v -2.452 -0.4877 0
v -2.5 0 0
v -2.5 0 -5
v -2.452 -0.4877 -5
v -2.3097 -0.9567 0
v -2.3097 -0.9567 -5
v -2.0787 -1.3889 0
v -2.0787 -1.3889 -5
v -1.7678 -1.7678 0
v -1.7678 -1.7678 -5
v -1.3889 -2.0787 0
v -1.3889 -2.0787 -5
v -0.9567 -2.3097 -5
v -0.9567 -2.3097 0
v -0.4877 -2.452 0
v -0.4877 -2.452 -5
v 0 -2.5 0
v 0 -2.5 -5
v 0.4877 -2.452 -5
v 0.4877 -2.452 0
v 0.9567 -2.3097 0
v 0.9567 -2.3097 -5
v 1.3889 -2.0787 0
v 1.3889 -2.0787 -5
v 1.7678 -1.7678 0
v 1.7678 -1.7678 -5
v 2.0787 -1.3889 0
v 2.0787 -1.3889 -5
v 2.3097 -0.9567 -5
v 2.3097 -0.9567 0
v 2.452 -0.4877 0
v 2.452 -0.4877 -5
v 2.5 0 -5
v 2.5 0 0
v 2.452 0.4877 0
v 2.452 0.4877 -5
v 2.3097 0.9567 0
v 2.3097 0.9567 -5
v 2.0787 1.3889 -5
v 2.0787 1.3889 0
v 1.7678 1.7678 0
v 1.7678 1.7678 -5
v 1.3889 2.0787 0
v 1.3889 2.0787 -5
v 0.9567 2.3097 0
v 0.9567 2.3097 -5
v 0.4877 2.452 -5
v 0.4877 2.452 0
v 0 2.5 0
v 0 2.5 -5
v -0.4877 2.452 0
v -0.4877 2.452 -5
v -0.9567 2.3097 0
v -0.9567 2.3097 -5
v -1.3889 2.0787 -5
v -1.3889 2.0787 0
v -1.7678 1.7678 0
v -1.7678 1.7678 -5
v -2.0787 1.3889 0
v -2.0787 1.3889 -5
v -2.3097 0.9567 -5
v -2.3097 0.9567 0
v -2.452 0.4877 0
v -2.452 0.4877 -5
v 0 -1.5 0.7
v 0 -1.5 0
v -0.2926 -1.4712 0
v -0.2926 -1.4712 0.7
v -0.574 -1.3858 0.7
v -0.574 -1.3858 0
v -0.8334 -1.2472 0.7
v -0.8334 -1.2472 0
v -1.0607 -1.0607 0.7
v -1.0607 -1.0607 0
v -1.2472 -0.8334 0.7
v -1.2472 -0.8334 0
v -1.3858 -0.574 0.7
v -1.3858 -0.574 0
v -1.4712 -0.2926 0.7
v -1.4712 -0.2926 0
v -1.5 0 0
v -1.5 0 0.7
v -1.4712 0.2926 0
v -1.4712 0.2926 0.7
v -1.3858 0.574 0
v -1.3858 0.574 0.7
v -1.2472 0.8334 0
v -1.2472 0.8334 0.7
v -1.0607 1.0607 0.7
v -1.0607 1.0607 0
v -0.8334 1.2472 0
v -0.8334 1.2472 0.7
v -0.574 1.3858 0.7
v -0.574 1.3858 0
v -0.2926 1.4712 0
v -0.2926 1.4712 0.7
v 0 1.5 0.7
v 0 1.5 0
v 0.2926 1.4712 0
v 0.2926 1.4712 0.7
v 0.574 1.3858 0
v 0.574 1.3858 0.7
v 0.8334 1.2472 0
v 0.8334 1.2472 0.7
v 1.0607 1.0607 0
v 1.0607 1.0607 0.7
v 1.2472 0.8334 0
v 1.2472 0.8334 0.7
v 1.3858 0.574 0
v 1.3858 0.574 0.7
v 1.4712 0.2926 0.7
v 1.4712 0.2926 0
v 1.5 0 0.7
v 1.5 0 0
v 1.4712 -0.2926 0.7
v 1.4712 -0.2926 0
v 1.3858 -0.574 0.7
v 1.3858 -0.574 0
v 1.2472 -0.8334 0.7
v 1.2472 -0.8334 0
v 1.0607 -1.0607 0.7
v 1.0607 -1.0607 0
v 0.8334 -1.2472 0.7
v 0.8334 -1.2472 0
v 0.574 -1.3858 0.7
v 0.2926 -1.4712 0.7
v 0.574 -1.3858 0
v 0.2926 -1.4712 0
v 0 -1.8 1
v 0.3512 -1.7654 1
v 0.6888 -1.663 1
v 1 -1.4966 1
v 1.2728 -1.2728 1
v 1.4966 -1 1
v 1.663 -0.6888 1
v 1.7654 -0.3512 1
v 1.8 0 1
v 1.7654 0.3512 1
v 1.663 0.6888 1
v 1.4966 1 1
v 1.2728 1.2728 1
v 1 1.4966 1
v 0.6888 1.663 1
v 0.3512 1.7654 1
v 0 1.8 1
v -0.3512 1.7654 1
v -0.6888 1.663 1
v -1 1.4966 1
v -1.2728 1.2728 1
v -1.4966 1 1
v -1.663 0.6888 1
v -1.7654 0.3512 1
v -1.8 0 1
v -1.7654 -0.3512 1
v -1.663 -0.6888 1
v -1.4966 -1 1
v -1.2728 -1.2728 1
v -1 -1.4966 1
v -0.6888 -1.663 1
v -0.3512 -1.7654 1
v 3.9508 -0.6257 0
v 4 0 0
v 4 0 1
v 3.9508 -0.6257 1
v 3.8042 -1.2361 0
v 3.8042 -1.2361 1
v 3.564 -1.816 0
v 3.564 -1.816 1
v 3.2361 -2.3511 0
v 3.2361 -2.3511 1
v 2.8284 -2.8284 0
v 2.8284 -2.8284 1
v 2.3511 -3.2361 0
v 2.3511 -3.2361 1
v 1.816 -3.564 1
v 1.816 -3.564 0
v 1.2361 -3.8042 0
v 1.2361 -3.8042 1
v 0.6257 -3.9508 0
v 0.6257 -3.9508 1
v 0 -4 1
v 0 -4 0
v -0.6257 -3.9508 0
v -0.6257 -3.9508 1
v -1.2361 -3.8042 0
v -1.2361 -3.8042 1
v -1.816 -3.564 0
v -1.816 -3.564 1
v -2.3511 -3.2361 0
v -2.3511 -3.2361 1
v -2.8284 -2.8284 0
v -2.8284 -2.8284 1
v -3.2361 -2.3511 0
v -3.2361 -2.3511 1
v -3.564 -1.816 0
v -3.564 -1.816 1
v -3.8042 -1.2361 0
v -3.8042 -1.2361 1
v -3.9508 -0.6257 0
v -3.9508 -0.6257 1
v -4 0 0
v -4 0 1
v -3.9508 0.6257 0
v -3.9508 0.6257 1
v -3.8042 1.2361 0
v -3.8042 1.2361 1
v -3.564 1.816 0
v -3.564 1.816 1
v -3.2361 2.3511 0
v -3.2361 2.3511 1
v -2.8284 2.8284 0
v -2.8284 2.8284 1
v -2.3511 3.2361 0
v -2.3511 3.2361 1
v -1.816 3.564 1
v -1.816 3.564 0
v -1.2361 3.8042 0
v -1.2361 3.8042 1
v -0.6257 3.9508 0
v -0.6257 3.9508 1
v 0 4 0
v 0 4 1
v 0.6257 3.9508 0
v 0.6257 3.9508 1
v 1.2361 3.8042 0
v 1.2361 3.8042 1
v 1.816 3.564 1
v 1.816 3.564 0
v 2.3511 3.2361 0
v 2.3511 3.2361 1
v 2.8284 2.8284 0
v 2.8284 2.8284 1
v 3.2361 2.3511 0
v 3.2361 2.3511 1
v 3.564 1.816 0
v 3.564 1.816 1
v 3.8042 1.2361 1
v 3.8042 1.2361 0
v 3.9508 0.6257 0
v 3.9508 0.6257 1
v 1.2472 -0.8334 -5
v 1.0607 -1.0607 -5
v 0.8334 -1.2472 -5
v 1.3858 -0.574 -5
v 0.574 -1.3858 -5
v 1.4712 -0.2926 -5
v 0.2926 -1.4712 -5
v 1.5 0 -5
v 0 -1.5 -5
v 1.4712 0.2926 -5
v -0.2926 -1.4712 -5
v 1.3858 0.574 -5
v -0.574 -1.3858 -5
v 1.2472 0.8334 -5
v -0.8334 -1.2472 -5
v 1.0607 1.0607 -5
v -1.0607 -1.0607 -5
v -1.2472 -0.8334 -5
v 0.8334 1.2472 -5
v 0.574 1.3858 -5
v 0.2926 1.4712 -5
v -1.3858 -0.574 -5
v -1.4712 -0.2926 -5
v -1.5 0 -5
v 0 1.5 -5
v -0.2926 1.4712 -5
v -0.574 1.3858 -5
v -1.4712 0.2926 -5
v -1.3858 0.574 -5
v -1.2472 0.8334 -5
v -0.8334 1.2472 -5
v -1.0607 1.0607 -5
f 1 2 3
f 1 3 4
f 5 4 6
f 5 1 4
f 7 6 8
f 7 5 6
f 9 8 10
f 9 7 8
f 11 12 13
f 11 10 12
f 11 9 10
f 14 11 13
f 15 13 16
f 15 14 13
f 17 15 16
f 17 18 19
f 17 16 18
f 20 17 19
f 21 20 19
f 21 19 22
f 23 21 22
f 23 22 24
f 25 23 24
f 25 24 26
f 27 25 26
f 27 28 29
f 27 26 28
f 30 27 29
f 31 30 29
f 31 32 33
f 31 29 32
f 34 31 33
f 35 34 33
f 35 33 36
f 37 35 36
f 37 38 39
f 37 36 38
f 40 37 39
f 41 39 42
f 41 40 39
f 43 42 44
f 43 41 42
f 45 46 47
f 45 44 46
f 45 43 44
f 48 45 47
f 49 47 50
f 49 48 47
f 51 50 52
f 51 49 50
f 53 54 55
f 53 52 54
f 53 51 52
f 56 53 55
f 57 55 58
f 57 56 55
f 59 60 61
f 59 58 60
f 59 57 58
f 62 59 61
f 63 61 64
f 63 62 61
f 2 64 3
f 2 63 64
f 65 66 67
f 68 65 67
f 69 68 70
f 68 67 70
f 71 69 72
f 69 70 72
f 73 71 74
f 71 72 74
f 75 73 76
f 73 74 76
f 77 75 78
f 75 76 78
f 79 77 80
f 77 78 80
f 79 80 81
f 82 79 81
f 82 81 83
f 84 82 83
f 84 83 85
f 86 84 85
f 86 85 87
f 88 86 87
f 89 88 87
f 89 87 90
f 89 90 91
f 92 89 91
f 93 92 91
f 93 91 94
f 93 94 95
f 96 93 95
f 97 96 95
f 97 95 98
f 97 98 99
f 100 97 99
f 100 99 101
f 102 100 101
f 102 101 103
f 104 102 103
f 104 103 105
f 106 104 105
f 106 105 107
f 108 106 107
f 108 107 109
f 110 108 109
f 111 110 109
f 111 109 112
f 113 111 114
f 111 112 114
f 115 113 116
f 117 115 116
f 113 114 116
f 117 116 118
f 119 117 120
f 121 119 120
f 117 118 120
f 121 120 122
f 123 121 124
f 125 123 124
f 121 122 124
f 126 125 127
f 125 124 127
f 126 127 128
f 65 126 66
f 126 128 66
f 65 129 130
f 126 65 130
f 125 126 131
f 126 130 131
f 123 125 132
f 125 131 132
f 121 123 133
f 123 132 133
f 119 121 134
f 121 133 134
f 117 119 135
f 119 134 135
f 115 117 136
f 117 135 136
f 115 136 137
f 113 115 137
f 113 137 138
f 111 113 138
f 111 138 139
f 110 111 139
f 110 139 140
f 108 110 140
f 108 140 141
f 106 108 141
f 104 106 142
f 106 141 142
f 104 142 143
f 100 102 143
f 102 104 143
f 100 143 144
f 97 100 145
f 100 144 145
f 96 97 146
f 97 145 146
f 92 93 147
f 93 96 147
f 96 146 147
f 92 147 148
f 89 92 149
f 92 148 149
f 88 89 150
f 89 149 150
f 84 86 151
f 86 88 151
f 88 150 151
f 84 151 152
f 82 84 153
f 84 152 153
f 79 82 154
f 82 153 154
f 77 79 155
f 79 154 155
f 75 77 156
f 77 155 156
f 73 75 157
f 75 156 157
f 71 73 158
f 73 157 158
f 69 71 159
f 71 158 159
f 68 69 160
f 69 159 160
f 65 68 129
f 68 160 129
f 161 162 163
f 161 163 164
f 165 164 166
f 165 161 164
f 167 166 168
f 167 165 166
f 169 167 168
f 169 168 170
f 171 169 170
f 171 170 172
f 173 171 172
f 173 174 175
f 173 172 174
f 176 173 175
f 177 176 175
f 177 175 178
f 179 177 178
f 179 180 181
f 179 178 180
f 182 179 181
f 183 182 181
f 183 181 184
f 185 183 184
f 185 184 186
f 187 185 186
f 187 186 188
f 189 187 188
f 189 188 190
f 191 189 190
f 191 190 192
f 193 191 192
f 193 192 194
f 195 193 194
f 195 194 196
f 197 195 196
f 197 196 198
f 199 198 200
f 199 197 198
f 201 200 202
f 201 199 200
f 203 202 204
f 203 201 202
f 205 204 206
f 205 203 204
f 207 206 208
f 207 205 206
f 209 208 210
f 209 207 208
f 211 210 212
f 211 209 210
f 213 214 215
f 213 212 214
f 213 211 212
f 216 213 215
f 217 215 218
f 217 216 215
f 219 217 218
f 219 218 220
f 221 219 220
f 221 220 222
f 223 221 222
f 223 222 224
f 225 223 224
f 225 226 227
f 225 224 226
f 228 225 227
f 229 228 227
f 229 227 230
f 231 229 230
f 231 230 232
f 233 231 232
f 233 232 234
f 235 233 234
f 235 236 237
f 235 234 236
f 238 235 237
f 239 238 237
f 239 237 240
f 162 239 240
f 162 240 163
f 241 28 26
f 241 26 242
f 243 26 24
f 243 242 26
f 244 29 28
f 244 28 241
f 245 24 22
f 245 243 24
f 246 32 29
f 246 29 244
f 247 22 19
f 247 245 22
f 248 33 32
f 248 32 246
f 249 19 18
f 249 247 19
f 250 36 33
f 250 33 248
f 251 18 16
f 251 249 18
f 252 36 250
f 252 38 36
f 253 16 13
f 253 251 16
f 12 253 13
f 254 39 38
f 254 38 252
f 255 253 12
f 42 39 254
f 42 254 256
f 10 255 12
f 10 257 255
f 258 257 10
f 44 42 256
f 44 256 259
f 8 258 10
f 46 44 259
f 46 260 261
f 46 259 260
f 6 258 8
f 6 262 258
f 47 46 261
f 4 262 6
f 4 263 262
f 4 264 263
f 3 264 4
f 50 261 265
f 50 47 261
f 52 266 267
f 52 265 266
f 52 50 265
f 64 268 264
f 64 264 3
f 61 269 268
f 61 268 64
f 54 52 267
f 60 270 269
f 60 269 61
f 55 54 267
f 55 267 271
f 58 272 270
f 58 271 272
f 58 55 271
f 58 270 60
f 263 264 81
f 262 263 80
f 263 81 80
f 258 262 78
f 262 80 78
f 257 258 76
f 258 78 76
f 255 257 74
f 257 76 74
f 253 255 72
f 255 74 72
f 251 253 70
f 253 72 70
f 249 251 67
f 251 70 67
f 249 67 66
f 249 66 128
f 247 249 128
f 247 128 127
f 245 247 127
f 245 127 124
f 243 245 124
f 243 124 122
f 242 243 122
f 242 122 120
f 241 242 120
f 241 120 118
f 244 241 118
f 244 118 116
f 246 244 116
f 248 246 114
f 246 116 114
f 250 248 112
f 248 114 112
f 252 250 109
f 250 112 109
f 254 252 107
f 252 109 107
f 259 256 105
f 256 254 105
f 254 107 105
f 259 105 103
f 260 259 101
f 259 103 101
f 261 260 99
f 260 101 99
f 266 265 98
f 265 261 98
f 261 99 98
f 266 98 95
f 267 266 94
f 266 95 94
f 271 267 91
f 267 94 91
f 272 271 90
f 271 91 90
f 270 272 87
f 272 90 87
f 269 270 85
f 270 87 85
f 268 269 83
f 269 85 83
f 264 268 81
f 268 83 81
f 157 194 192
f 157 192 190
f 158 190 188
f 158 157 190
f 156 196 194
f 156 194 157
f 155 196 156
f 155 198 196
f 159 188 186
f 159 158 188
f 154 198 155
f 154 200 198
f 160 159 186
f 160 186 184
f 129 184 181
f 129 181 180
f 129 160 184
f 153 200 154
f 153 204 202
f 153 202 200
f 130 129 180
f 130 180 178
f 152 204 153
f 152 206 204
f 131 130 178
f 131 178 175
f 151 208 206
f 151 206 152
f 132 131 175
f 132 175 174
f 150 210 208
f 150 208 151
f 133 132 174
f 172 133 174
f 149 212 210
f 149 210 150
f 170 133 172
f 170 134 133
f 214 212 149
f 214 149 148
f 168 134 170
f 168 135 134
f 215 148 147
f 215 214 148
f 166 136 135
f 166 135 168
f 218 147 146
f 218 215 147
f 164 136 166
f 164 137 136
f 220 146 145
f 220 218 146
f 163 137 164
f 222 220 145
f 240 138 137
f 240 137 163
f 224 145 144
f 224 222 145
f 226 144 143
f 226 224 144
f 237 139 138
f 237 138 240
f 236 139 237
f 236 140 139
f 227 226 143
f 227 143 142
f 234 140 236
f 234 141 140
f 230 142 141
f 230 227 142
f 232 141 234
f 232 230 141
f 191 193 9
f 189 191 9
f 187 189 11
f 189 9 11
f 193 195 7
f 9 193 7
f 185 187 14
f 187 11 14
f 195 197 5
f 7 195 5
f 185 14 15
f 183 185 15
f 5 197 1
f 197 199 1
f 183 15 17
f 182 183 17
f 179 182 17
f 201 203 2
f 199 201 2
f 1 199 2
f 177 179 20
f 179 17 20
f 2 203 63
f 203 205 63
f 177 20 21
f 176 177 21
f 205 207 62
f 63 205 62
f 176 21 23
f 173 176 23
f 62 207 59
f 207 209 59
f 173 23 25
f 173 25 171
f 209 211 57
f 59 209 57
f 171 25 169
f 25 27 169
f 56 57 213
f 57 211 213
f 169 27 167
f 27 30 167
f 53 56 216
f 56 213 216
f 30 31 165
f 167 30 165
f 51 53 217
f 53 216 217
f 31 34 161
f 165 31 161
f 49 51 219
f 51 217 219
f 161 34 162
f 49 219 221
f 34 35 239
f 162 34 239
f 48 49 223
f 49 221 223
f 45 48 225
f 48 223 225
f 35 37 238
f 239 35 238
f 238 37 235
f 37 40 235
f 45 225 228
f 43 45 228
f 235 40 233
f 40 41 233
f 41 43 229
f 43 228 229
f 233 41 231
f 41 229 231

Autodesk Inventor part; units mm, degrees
ref_plane "YZ Plane" through (0, 0, 0) normal (1, 0, 0) x (0, 1, 0)
ref_plane "XZ Plane" through (0, 0, 0) normal (0, 1, 0) x (-1, 0, 0)
ref_plane "XY Plane" through (0, 0, 0) normal (0, 0, 1) x (1, 0, 0)
sketch "スケッチ1" plane through (0, 0, 0) normal (0, 0, 1) x (1, 0, 0)
  circle A0 centre (0, 0) radius 4
  dimension "d0" = 8
extrude "押し出し1" add sketch "スケッチ1" along normal blind 1
sketch "スケッチ2" plane through (0, 0, 1) normal (0, 0, 1) x (1, 0, 0)
  circle A0 centre (0, 0) radius 1.5
  dimension "d3" = 3
hole "穴1" at (0, 0, 1) direction (0, 0, -1) diameter 3 end through all
chamfer "面取り1" distance 0.3 angle 45 1 edges at (0, 1.5, 1)
sketch "スケッチ3" plane through (0, 0, 0) normal (0, 0, -1) x (-1, 0, 0)
  circle A0 centre (0, 0) radius 1.5
  circle A1 centre (0, 0) radius 1.5 projected
  circle A2 centre (0, 0) radius 2.5
  dimension "d14" = 5
extrude "押し出し2" add sketch "スケッチ3" along normal blind 5
properties part number "RD018_ブッシュ80F-0305"
